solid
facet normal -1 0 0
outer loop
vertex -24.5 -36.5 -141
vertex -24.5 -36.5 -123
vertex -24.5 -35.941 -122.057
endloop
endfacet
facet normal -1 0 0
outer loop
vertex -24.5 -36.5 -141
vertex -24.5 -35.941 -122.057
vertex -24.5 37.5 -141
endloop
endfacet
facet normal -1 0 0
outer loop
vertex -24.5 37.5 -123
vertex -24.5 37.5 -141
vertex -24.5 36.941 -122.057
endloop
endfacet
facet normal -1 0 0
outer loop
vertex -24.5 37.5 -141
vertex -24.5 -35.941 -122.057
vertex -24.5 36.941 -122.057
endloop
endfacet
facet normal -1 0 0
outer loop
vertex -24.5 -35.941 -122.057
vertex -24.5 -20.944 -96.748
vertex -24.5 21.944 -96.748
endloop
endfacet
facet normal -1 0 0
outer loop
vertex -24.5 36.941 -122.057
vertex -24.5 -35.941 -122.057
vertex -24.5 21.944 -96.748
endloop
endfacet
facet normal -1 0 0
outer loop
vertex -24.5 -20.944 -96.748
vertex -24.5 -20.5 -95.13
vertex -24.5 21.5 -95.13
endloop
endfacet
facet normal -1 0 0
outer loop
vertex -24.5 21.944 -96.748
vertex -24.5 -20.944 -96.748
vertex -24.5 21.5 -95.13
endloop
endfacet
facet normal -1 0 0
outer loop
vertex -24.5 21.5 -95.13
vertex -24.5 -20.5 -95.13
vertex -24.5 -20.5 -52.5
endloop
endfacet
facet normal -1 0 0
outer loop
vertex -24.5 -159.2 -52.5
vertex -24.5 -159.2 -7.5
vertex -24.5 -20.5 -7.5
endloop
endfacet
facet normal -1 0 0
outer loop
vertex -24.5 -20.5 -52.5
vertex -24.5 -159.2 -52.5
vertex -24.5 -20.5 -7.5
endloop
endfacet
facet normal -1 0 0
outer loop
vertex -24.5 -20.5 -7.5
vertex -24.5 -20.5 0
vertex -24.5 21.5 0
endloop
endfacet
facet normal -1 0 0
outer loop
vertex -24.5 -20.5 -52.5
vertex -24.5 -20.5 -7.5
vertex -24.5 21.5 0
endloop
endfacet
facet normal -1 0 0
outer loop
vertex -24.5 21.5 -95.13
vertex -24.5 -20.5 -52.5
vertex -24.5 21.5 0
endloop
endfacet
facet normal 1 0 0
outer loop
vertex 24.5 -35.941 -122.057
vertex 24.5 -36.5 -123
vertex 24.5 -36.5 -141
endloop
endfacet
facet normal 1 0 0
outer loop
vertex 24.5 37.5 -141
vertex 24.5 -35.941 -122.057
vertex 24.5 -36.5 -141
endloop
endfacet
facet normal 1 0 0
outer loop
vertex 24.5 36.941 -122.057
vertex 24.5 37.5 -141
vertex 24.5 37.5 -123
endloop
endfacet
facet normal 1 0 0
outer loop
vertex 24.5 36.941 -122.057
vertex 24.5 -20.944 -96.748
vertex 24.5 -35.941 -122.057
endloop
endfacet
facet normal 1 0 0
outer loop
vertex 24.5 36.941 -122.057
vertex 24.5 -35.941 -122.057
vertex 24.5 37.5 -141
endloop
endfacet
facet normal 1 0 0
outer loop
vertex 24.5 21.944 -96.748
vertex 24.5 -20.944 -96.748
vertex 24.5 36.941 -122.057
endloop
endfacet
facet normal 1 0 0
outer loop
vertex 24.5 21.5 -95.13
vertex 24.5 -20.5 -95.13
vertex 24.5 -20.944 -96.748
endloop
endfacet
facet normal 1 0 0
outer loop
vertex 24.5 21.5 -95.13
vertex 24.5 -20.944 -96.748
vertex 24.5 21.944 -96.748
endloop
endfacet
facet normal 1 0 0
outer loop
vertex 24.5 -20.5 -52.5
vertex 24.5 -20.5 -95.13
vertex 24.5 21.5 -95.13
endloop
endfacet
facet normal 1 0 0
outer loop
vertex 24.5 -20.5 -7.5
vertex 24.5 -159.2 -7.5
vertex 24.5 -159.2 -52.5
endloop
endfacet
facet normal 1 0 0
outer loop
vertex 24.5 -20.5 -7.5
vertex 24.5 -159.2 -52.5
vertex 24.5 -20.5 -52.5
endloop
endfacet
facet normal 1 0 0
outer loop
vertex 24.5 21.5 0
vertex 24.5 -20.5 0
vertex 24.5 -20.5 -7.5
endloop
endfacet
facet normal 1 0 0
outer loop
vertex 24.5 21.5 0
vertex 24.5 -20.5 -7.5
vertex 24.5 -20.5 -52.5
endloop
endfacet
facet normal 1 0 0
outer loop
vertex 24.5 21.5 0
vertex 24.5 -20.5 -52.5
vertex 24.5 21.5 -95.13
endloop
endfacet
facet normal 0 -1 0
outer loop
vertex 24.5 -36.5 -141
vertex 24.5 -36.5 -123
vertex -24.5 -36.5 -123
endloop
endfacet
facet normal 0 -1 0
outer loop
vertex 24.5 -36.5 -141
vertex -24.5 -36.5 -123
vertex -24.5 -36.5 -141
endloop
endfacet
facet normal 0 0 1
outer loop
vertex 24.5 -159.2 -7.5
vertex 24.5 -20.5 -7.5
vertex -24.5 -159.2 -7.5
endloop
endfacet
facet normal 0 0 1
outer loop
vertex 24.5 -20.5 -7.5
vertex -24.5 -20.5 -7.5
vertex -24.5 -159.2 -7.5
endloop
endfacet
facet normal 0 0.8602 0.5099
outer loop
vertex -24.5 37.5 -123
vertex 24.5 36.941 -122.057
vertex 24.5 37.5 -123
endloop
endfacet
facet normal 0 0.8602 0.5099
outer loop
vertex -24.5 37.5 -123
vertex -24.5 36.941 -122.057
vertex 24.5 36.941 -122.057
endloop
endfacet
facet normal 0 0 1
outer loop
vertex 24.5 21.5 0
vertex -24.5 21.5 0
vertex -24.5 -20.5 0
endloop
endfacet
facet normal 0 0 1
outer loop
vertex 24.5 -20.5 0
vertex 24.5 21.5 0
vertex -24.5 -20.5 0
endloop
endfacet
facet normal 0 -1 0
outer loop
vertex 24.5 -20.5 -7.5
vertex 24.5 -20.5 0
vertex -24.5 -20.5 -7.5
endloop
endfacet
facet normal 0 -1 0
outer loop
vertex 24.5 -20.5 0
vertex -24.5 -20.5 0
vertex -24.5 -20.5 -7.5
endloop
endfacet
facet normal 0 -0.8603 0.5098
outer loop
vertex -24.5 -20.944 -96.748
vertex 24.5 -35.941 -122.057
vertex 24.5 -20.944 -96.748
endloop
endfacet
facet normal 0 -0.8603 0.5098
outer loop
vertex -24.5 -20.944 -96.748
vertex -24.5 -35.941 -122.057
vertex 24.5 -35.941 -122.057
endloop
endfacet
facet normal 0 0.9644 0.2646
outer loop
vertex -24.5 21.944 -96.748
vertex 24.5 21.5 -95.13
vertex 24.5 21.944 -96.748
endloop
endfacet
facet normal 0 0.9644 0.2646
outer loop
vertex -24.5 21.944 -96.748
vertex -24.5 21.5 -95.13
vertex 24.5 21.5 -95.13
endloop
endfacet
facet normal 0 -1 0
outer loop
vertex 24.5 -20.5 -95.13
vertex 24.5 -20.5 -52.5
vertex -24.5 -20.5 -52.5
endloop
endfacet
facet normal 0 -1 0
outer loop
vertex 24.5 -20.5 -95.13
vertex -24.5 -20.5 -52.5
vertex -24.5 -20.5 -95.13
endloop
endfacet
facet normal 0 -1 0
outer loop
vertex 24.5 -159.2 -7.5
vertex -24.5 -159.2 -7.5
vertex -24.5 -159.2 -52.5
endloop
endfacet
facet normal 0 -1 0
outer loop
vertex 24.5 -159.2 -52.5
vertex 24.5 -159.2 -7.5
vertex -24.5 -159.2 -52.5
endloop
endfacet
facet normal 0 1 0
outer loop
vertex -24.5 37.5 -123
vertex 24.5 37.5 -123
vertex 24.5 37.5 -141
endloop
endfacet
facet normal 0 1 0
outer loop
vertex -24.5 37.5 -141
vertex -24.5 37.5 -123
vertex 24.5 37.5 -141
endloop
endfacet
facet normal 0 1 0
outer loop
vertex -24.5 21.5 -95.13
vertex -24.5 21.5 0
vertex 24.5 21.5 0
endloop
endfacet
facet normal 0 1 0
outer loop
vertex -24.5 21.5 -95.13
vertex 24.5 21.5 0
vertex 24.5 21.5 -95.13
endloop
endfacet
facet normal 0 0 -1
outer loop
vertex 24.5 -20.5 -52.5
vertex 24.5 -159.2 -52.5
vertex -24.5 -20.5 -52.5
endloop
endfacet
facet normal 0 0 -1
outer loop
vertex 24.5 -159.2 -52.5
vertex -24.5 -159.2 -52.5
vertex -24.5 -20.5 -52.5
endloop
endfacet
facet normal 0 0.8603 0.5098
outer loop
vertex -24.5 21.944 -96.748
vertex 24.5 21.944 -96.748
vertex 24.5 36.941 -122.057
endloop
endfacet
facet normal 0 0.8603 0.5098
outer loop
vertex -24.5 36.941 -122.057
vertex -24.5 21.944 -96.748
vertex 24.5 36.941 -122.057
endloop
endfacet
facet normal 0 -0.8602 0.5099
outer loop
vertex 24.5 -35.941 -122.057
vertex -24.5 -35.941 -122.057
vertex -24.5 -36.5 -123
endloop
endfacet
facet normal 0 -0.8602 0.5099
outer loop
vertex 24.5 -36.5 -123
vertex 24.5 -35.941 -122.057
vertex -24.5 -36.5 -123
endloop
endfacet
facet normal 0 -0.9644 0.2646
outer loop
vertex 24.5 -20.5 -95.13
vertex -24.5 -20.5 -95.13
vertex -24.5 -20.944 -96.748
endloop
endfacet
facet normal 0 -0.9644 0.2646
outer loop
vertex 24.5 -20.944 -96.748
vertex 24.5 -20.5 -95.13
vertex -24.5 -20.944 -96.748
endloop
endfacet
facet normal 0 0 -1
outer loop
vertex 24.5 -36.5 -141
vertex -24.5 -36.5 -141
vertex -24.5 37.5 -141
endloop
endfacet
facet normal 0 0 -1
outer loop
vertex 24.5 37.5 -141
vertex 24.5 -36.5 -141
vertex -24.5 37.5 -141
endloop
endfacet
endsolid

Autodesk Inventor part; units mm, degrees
ref_plane "YZ Plane" through (0, 0, 0) normal (1, 0, 0) x (0, 1, 0)
ref_plane "XZ Plane" through (0, 0, 0) normal (0, 1, 0) x (-1, 0, 0)
ref_plane "XY Plane" through (0, 0, 0) normal (0, 0, 1) x (1, 0, 0)
sketch "Sketch1" plane through (0, 0, 0) normal (1, 0, 0) x (0, 1, 0)
  line L0 (16, 0) -> (-16, 0)
  line L1 (16, 0) -> (-16, 0) construction
  line L2 (21.5, 0) -> (16, 0)
  line L3 (21.9436, -96.7485) -> (36.9412, -122.057)
  line L4 (21.5, -4) -> (21.5, -95.1299)
  line L5 (21.5, -95.1299) -> (21.9436, -96.7485)
  line L6 (37.5, -124.0962) -> (37.5, -137.065)
  line L7 (36.9412, -122.057) -> (37.5, -123)
  line L8 (37.5, -123) -> (37.5, -124.0962)
  arc A0 (37.5, -124.0962) -> (36.9412, -122.057) centre (33.5, -124.0962) ccw construction
  line L9 (-16, 0) -> (-20.5, 0)
  line L10 (-20.5, 0) -> (-20.5, -95.1299)
  line L11 (-20.5, -95.1299) -> (-20.5, -4) construction
  line L12 (-20.5, -7.5) -> (-159.2, -7.5)
  line L13 (-159.2, -7.5) -> (-159.2, -52.5)
  line L14 (-159.2, -52.5) -> (-20.5, -52.5)
  line L15 (-73.4, -7.5) -> (-107.4, -7.5) construction
  line L16 (-73.4, -52.5) -> (-107.4, -52.5) construction
  line L17 (-159.2, -35.5) -> (-159.2, -24.5) construction
  line L18 (-35.9412, -122.057) -> (-20.9436, -96.7485)
  line L19 (-20.5, -95.1299) -> (-20.9436, -96.7485)
  line L20 (-36.5, -137.065) -> (-36.5, -124.0962)
  arc A1 (-35.9412, -122.057) -> (-36.5, -124.0962) centre (-32.5, -124.0962) ccw construction
  line L21 (-35.9412, -122.057) -> (-36.5, -123)
  line L22 (-36.5, -123) -> (-36.5, -124.0962)
  line L23 (-36.5, -137.065) -> (-36.5, -141)
  line L24 (-36.5, -141) -> (37.5, -141)
  line L25 (37.5, -141) -> (37.5, -137.065)
  line L26 (-36.5, -139.095) -> (-36.5, -141) construction
  line L27 (37.5, -141) -> (37.5, -139.095) construction
  line L28 (-33.325, -141) -> (34.325, -141) construction
  line L29 (21.5, 0) -> (21.5, -4)
  point P0 (0, 0)
  point P1 (0, 0)
  point P2 (21.5, -10)
  point P3 (16, 0)
  point P4 (-20.5, -52.5)
extrude "Extrusion3" add sketch "Sketch1" along normal mid plane 49
properties part number "BaseBoundingBox"
